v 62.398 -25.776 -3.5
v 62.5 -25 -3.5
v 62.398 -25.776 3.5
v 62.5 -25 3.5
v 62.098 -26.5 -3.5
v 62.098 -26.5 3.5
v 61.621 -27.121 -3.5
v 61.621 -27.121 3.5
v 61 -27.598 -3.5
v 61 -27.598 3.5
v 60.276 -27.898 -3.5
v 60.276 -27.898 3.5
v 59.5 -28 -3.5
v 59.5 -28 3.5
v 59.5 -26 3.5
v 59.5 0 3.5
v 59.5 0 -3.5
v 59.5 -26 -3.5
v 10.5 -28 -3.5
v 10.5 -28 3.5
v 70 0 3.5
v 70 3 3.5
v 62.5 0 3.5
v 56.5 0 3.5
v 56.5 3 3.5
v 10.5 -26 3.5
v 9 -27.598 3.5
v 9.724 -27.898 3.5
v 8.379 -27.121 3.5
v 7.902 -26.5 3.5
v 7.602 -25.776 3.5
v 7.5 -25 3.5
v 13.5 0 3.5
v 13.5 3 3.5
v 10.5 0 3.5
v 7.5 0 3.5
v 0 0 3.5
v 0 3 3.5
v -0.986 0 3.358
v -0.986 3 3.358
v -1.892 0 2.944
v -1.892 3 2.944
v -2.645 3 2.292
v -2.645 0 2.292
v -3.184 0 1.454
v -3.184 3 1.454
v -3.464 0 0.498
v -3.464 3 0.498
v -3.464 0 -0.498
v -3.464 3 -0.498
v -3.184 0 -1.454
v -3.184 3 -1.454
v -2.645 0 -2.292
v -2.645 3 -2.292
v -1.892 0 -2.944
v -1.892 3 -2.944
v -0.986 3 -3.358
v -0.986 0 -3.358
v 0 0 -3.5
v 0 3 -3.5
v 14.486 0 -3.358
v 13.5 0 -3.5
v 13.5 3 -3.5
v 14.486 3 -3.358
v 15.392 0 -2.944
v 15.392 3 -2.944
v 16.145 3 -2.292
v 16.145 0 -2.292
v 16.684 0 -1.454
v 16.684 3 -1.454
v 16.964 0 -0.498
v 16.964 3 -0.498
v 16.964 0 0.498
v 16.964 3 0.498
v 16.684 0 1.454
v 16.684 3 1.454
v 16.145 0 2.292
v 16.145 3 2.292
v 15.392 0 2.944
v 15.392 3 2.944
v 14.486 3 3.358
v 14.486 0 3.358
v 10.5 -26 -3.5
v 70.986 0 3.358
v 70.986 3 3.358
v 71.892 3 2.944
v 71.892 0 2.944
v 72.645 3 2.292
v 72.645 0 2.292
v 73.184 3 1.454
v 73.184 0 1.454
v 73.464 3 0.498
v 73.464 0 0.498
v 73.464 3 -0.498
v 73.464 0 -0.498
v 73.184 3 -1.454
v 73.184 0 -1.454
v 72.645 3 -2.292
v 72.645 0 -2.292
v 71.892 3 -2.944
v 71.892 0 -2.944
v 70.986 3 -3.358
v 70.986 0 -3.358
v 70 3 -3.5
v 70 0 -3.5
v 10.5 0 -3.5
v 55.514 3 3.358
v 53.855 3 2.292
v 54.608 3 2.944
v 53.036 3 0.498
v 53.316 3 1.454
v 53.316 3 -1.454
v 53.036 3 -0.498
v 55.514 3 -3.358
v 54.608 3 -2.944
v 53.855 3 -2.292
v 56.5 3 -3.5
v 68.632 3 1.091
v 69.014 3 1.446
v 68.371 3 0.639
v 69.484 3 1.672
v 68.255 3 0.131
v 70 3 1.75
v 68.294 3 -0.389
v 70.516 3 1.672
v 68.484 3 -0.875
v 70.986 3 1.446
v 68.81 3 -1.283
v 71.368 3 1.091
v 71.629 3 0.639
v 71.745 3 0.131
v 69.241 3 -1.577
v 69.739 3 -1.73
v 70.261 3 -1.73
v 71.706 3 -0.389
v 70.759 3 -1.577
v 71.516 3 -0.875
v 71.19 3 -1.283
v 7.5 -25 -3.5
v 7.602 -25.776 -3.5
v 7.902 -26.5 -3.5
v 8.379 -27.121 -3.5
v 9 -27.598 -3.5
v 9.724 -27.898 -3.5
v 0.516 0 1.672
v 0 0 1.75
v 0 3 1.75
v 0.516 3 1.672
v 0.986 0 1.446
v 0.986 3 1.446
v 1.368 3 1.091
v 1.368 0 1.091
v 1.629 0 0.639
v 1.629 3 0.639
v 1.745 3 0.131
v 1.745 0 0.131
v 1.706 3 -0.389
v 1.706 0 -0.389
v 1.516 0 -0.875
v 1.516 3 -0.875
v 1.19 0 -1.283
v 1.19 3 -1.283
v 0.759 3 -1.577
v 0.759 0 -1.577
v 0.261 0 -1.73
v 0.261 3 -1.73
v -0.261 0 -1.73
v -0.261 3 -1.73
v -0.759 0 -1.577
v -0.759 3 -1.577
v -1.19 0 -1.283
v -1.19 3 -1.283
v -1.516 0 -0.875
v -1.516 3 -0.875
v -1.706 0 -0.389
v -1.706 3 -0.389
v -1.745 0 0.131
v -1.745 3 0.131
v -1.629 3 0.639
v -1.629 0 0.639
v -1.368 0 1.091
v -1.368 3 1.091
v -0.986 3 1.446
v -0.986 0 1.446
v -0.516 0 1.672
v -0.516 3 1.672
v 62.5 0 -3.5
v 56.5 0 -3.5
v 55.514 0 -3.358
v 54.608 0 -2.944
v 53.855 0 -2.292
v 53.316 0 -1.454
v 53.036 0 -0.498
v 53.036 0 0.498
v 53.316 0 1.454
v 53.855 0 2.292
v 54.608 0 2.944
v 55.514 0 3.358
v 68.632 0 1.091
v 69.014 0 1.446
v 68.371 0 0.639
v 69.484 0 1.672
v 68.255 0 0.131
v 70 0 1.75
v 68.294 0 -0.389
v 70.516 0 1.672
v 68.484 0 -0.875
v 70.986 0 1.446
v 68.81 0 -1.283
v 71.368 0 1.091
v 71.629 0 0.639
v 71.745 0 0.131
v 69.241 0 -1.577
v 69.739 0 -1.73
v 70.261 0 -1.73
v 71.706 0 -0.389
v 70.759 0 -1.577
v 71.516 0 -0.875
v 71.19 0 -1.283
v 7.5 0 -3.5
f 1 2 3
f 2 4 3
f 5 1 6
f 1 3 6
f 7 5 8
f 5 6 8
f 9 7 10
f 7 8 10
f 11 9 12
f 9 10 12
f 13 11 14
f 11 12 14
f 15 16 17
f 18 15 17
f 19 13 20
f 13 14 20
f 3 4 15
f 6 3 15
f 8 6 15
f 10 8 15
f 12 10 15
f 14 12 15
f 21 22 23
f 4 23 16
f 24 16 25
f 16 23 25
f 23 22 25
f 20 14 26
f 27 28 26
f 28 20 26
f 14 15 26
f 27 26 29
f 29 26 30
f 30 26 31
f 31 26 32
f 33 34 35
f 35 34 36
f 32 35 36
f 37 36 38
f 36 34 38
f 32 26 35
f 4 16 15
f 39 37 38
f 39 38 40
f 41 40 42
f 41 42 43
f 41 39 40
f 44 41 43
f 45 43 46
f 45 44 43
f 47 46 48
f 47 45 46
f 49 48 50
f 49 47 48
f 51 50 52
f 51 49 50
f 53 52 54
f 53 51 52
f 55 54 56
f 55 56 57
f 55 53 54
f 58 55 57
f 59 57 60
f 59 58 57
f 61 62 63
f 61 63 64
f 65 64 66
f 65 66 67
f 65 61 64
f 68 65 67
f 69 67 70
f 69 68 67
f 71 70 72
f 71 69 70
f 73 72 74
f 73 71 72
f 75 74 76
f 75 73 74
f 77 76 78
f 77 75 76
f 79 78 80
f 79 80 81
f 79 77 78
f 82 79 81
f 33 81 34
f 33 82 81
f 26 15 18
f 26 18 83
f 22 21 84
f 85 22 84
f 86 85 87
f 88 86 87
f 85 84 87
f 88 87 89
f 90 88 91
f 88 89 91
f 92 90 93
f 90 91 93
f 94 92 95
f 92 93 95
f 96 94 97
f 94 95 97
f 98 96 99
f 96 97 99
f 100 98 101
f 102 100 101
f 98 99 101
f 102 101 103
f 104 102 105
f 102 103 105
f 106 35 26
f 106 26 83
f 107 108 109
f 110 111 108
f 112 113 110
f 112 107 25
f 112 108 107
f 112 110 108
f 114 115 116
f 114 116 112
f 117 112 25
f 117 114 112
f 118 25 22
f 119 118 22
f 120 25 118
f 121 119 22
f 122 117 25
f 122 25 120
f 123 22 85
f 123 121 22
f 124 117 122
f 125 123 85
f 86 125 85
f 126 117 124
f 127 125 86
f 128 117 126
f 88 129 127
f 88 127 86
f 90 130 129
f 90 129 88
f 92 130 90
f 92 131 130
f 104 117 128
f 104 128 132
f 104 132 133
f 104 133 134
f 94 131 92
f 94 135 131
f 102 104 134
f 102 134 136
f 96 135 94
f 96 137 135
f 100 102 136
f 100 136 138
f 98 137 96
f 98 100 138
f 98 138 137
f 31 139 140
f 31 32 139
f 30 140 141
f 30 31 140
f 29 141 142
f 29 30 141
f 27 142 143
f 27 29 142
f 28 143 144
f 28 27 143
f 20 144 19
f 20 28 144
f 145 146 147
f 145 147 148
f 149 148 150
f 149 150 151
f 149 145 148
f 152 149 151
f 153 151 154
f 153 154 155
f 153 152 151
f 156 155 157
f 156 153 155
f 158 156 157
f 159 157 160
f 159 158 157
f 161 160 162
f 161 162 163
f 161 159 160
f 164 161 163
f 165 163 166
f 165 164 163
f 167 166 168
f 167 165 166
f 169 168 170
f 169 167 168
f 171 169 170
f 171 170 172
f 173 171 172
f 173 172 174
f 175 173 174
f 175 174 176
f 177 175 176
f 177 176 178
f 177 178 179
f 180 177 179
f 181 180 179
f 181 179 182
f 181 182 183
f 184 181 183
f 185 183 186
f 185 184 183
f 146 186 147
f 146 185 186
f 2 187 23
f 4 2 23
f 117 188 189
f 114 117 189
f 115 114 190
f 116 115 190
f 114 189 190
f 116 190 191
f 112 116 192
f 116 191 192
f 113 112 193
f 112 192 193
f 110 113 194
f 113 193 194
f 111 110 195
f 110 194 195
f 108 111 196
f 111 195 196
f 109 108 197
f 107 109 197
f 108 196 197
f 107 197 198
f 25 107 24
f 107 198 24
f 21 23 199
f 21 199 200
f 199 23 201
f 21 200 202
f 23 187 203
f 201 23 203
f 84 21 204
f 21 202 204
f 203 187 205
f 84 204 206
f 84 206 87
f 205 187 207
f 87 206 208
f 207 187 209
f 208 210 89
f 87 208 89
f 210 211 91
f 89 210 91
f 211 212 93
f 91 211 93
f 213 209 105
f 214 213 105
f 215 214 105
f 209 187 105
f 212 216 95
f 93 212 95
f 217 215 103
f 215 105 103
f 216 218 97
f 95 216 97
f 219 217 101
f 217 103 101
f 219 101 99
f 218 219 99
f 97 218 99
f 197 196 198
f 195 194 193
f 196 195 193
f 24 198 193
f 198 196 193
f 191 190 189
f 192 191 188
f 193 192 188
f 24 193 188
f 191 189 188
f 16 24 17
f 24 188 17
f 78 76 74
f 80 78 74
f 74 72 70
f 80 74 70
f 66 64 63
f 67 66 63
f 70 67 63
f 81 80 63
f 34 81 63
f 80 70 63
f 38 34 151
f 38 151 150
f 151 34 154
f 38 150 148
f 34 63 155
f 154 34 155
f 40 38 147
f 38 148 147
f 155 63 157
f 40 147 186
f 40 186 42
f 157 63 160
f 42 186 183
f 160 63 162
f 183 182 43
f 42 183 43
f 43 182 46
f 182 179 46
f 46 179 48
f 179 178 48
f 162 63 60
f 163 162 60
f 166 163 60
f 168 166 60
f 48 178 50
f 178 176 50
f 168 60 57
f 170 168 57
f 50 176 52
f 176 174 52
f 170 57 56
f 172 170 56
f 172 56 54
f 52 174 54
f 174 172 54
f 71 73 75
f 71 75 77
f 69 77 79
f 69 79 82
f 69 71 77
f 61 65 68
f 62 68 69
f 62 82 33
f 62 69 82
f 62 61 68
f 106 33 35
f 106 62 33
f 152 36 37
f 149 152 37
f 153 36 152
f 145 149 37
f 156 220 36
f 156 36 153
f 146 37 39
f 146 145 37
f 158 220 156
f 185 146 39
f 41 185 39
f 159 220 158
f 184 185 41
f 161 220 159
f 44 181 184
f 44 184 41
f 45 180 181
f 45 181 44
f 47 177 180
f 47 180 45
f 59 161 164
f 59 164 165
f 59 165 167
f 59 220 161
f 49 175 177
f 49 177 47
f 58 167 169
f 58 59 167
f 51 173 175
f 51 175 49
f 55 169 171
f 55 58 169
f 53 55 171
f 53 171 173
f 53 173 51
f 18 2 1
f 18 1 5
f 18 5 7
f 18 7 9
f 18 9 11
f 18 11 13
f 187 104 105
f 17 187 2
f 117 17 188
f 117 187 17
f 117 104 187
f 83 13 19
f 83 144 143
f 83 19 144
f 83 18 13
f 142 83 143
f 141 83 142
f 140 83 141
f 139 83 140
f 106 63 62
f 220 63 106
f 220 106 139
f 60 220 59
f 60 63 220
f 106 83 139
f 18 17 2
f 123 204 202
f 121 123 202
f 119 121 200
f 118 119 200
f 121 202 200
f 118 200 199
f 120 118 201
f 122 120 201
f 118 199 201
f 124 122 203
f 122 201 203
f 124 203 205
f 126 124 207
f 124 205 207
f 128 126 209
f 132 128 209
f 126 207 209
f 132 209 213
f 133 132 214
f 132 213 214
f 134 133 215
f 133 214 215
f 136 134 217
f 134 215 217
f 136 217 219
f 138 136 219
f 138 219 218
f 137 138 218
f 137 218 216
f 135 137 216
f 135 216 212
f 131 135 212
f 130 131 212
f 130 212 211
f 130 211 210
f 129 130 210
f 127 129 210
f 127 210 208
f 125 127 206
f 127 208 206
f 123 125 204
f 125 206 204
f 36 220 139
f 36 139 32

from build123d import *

# Parameters (mm, degrees)
SKETCH1_R           = 1.75
BOSS_EXTRUDE1_DEPTH = 3
SKETCH2_W           = 3
SKETCH2_H           = 7
BOSS_EXTRUDE2_DEPTH = 26
SKETCH3_W           = 27.49999964
SKETCH3_H           = 7
BOSS_EXTRUDE3_DEPTH = 2
FILLET1_R           = 3


with BuildPart() as part:
    # Sketch1 → Boss-Extrude1 (new body)
    with BuildSketch(Plane(origin=(0, 0, 0), x_dir=(1, 0, 0), z_dir=(0, 1, 0))):
        with BuildLine():
            Line((0, 3.5), (10.5, 3.5))
            Line((10.5, 3.5), (13.5, 3.5))
            ThreePointArc((13.5, 3.5), (17, 0), (13.5, -3.5))
            Line((13.5, -3.5), (10.5, -3.5))
            Line((10.5, -3.5), (0, -3.5))
            ThreePointArc((0, -3.5), (-3.5, 0), (0, 3.5))
        make_face()
        with Locations(Location((0, 0, 0), (0, 0, 270))):
            Circle(SKETCH1_R, mode=Mode.SUBTRACT)
    extrude(amount=BOSS_EXTRUDE1_DEPTH)

    # Sketch2 → Boss-Extrude2 (add)
    with BuildSketch(Plane(origin=(0, 0, 0), x_dir=(1, 0, 0), z_dir=(0, 1, 0))):
        with Locations((9, 0)):
            Rectangle(SKETCH2_W, SKETCH2_H)
    extrude(amount=-BOSS_EXTRUDE2_DEPTH)

    # Sketch3 → Boss-Extrude3 (add)
    with BuildSketch(Plane.XZ.offset(26)):
        with Locations((21.24999982, 0)):
            Rectangle(SKETCH3_W, SKETCH3_H)
    extrude(amount=BOSS_EXTRUDE3_DEPTH)

    # Fillet1
    fillet1_edges = [part.edges().sort_by_distance(p)[0] for p in [
        (7.5, -28, 0),
    ]]
    fillet(fillet1_edges, radius=FILLET1_R)

    # Mirror1: part across plane


with BuildPart() as part_1:
    add(part.part)
    add(part.part.mirror(Plane(origin=(34.99999964, -28, -3.5), x_dir=(0, 0, 1), z_dir=(-1, 0, 0))))


solid = part_1.part
